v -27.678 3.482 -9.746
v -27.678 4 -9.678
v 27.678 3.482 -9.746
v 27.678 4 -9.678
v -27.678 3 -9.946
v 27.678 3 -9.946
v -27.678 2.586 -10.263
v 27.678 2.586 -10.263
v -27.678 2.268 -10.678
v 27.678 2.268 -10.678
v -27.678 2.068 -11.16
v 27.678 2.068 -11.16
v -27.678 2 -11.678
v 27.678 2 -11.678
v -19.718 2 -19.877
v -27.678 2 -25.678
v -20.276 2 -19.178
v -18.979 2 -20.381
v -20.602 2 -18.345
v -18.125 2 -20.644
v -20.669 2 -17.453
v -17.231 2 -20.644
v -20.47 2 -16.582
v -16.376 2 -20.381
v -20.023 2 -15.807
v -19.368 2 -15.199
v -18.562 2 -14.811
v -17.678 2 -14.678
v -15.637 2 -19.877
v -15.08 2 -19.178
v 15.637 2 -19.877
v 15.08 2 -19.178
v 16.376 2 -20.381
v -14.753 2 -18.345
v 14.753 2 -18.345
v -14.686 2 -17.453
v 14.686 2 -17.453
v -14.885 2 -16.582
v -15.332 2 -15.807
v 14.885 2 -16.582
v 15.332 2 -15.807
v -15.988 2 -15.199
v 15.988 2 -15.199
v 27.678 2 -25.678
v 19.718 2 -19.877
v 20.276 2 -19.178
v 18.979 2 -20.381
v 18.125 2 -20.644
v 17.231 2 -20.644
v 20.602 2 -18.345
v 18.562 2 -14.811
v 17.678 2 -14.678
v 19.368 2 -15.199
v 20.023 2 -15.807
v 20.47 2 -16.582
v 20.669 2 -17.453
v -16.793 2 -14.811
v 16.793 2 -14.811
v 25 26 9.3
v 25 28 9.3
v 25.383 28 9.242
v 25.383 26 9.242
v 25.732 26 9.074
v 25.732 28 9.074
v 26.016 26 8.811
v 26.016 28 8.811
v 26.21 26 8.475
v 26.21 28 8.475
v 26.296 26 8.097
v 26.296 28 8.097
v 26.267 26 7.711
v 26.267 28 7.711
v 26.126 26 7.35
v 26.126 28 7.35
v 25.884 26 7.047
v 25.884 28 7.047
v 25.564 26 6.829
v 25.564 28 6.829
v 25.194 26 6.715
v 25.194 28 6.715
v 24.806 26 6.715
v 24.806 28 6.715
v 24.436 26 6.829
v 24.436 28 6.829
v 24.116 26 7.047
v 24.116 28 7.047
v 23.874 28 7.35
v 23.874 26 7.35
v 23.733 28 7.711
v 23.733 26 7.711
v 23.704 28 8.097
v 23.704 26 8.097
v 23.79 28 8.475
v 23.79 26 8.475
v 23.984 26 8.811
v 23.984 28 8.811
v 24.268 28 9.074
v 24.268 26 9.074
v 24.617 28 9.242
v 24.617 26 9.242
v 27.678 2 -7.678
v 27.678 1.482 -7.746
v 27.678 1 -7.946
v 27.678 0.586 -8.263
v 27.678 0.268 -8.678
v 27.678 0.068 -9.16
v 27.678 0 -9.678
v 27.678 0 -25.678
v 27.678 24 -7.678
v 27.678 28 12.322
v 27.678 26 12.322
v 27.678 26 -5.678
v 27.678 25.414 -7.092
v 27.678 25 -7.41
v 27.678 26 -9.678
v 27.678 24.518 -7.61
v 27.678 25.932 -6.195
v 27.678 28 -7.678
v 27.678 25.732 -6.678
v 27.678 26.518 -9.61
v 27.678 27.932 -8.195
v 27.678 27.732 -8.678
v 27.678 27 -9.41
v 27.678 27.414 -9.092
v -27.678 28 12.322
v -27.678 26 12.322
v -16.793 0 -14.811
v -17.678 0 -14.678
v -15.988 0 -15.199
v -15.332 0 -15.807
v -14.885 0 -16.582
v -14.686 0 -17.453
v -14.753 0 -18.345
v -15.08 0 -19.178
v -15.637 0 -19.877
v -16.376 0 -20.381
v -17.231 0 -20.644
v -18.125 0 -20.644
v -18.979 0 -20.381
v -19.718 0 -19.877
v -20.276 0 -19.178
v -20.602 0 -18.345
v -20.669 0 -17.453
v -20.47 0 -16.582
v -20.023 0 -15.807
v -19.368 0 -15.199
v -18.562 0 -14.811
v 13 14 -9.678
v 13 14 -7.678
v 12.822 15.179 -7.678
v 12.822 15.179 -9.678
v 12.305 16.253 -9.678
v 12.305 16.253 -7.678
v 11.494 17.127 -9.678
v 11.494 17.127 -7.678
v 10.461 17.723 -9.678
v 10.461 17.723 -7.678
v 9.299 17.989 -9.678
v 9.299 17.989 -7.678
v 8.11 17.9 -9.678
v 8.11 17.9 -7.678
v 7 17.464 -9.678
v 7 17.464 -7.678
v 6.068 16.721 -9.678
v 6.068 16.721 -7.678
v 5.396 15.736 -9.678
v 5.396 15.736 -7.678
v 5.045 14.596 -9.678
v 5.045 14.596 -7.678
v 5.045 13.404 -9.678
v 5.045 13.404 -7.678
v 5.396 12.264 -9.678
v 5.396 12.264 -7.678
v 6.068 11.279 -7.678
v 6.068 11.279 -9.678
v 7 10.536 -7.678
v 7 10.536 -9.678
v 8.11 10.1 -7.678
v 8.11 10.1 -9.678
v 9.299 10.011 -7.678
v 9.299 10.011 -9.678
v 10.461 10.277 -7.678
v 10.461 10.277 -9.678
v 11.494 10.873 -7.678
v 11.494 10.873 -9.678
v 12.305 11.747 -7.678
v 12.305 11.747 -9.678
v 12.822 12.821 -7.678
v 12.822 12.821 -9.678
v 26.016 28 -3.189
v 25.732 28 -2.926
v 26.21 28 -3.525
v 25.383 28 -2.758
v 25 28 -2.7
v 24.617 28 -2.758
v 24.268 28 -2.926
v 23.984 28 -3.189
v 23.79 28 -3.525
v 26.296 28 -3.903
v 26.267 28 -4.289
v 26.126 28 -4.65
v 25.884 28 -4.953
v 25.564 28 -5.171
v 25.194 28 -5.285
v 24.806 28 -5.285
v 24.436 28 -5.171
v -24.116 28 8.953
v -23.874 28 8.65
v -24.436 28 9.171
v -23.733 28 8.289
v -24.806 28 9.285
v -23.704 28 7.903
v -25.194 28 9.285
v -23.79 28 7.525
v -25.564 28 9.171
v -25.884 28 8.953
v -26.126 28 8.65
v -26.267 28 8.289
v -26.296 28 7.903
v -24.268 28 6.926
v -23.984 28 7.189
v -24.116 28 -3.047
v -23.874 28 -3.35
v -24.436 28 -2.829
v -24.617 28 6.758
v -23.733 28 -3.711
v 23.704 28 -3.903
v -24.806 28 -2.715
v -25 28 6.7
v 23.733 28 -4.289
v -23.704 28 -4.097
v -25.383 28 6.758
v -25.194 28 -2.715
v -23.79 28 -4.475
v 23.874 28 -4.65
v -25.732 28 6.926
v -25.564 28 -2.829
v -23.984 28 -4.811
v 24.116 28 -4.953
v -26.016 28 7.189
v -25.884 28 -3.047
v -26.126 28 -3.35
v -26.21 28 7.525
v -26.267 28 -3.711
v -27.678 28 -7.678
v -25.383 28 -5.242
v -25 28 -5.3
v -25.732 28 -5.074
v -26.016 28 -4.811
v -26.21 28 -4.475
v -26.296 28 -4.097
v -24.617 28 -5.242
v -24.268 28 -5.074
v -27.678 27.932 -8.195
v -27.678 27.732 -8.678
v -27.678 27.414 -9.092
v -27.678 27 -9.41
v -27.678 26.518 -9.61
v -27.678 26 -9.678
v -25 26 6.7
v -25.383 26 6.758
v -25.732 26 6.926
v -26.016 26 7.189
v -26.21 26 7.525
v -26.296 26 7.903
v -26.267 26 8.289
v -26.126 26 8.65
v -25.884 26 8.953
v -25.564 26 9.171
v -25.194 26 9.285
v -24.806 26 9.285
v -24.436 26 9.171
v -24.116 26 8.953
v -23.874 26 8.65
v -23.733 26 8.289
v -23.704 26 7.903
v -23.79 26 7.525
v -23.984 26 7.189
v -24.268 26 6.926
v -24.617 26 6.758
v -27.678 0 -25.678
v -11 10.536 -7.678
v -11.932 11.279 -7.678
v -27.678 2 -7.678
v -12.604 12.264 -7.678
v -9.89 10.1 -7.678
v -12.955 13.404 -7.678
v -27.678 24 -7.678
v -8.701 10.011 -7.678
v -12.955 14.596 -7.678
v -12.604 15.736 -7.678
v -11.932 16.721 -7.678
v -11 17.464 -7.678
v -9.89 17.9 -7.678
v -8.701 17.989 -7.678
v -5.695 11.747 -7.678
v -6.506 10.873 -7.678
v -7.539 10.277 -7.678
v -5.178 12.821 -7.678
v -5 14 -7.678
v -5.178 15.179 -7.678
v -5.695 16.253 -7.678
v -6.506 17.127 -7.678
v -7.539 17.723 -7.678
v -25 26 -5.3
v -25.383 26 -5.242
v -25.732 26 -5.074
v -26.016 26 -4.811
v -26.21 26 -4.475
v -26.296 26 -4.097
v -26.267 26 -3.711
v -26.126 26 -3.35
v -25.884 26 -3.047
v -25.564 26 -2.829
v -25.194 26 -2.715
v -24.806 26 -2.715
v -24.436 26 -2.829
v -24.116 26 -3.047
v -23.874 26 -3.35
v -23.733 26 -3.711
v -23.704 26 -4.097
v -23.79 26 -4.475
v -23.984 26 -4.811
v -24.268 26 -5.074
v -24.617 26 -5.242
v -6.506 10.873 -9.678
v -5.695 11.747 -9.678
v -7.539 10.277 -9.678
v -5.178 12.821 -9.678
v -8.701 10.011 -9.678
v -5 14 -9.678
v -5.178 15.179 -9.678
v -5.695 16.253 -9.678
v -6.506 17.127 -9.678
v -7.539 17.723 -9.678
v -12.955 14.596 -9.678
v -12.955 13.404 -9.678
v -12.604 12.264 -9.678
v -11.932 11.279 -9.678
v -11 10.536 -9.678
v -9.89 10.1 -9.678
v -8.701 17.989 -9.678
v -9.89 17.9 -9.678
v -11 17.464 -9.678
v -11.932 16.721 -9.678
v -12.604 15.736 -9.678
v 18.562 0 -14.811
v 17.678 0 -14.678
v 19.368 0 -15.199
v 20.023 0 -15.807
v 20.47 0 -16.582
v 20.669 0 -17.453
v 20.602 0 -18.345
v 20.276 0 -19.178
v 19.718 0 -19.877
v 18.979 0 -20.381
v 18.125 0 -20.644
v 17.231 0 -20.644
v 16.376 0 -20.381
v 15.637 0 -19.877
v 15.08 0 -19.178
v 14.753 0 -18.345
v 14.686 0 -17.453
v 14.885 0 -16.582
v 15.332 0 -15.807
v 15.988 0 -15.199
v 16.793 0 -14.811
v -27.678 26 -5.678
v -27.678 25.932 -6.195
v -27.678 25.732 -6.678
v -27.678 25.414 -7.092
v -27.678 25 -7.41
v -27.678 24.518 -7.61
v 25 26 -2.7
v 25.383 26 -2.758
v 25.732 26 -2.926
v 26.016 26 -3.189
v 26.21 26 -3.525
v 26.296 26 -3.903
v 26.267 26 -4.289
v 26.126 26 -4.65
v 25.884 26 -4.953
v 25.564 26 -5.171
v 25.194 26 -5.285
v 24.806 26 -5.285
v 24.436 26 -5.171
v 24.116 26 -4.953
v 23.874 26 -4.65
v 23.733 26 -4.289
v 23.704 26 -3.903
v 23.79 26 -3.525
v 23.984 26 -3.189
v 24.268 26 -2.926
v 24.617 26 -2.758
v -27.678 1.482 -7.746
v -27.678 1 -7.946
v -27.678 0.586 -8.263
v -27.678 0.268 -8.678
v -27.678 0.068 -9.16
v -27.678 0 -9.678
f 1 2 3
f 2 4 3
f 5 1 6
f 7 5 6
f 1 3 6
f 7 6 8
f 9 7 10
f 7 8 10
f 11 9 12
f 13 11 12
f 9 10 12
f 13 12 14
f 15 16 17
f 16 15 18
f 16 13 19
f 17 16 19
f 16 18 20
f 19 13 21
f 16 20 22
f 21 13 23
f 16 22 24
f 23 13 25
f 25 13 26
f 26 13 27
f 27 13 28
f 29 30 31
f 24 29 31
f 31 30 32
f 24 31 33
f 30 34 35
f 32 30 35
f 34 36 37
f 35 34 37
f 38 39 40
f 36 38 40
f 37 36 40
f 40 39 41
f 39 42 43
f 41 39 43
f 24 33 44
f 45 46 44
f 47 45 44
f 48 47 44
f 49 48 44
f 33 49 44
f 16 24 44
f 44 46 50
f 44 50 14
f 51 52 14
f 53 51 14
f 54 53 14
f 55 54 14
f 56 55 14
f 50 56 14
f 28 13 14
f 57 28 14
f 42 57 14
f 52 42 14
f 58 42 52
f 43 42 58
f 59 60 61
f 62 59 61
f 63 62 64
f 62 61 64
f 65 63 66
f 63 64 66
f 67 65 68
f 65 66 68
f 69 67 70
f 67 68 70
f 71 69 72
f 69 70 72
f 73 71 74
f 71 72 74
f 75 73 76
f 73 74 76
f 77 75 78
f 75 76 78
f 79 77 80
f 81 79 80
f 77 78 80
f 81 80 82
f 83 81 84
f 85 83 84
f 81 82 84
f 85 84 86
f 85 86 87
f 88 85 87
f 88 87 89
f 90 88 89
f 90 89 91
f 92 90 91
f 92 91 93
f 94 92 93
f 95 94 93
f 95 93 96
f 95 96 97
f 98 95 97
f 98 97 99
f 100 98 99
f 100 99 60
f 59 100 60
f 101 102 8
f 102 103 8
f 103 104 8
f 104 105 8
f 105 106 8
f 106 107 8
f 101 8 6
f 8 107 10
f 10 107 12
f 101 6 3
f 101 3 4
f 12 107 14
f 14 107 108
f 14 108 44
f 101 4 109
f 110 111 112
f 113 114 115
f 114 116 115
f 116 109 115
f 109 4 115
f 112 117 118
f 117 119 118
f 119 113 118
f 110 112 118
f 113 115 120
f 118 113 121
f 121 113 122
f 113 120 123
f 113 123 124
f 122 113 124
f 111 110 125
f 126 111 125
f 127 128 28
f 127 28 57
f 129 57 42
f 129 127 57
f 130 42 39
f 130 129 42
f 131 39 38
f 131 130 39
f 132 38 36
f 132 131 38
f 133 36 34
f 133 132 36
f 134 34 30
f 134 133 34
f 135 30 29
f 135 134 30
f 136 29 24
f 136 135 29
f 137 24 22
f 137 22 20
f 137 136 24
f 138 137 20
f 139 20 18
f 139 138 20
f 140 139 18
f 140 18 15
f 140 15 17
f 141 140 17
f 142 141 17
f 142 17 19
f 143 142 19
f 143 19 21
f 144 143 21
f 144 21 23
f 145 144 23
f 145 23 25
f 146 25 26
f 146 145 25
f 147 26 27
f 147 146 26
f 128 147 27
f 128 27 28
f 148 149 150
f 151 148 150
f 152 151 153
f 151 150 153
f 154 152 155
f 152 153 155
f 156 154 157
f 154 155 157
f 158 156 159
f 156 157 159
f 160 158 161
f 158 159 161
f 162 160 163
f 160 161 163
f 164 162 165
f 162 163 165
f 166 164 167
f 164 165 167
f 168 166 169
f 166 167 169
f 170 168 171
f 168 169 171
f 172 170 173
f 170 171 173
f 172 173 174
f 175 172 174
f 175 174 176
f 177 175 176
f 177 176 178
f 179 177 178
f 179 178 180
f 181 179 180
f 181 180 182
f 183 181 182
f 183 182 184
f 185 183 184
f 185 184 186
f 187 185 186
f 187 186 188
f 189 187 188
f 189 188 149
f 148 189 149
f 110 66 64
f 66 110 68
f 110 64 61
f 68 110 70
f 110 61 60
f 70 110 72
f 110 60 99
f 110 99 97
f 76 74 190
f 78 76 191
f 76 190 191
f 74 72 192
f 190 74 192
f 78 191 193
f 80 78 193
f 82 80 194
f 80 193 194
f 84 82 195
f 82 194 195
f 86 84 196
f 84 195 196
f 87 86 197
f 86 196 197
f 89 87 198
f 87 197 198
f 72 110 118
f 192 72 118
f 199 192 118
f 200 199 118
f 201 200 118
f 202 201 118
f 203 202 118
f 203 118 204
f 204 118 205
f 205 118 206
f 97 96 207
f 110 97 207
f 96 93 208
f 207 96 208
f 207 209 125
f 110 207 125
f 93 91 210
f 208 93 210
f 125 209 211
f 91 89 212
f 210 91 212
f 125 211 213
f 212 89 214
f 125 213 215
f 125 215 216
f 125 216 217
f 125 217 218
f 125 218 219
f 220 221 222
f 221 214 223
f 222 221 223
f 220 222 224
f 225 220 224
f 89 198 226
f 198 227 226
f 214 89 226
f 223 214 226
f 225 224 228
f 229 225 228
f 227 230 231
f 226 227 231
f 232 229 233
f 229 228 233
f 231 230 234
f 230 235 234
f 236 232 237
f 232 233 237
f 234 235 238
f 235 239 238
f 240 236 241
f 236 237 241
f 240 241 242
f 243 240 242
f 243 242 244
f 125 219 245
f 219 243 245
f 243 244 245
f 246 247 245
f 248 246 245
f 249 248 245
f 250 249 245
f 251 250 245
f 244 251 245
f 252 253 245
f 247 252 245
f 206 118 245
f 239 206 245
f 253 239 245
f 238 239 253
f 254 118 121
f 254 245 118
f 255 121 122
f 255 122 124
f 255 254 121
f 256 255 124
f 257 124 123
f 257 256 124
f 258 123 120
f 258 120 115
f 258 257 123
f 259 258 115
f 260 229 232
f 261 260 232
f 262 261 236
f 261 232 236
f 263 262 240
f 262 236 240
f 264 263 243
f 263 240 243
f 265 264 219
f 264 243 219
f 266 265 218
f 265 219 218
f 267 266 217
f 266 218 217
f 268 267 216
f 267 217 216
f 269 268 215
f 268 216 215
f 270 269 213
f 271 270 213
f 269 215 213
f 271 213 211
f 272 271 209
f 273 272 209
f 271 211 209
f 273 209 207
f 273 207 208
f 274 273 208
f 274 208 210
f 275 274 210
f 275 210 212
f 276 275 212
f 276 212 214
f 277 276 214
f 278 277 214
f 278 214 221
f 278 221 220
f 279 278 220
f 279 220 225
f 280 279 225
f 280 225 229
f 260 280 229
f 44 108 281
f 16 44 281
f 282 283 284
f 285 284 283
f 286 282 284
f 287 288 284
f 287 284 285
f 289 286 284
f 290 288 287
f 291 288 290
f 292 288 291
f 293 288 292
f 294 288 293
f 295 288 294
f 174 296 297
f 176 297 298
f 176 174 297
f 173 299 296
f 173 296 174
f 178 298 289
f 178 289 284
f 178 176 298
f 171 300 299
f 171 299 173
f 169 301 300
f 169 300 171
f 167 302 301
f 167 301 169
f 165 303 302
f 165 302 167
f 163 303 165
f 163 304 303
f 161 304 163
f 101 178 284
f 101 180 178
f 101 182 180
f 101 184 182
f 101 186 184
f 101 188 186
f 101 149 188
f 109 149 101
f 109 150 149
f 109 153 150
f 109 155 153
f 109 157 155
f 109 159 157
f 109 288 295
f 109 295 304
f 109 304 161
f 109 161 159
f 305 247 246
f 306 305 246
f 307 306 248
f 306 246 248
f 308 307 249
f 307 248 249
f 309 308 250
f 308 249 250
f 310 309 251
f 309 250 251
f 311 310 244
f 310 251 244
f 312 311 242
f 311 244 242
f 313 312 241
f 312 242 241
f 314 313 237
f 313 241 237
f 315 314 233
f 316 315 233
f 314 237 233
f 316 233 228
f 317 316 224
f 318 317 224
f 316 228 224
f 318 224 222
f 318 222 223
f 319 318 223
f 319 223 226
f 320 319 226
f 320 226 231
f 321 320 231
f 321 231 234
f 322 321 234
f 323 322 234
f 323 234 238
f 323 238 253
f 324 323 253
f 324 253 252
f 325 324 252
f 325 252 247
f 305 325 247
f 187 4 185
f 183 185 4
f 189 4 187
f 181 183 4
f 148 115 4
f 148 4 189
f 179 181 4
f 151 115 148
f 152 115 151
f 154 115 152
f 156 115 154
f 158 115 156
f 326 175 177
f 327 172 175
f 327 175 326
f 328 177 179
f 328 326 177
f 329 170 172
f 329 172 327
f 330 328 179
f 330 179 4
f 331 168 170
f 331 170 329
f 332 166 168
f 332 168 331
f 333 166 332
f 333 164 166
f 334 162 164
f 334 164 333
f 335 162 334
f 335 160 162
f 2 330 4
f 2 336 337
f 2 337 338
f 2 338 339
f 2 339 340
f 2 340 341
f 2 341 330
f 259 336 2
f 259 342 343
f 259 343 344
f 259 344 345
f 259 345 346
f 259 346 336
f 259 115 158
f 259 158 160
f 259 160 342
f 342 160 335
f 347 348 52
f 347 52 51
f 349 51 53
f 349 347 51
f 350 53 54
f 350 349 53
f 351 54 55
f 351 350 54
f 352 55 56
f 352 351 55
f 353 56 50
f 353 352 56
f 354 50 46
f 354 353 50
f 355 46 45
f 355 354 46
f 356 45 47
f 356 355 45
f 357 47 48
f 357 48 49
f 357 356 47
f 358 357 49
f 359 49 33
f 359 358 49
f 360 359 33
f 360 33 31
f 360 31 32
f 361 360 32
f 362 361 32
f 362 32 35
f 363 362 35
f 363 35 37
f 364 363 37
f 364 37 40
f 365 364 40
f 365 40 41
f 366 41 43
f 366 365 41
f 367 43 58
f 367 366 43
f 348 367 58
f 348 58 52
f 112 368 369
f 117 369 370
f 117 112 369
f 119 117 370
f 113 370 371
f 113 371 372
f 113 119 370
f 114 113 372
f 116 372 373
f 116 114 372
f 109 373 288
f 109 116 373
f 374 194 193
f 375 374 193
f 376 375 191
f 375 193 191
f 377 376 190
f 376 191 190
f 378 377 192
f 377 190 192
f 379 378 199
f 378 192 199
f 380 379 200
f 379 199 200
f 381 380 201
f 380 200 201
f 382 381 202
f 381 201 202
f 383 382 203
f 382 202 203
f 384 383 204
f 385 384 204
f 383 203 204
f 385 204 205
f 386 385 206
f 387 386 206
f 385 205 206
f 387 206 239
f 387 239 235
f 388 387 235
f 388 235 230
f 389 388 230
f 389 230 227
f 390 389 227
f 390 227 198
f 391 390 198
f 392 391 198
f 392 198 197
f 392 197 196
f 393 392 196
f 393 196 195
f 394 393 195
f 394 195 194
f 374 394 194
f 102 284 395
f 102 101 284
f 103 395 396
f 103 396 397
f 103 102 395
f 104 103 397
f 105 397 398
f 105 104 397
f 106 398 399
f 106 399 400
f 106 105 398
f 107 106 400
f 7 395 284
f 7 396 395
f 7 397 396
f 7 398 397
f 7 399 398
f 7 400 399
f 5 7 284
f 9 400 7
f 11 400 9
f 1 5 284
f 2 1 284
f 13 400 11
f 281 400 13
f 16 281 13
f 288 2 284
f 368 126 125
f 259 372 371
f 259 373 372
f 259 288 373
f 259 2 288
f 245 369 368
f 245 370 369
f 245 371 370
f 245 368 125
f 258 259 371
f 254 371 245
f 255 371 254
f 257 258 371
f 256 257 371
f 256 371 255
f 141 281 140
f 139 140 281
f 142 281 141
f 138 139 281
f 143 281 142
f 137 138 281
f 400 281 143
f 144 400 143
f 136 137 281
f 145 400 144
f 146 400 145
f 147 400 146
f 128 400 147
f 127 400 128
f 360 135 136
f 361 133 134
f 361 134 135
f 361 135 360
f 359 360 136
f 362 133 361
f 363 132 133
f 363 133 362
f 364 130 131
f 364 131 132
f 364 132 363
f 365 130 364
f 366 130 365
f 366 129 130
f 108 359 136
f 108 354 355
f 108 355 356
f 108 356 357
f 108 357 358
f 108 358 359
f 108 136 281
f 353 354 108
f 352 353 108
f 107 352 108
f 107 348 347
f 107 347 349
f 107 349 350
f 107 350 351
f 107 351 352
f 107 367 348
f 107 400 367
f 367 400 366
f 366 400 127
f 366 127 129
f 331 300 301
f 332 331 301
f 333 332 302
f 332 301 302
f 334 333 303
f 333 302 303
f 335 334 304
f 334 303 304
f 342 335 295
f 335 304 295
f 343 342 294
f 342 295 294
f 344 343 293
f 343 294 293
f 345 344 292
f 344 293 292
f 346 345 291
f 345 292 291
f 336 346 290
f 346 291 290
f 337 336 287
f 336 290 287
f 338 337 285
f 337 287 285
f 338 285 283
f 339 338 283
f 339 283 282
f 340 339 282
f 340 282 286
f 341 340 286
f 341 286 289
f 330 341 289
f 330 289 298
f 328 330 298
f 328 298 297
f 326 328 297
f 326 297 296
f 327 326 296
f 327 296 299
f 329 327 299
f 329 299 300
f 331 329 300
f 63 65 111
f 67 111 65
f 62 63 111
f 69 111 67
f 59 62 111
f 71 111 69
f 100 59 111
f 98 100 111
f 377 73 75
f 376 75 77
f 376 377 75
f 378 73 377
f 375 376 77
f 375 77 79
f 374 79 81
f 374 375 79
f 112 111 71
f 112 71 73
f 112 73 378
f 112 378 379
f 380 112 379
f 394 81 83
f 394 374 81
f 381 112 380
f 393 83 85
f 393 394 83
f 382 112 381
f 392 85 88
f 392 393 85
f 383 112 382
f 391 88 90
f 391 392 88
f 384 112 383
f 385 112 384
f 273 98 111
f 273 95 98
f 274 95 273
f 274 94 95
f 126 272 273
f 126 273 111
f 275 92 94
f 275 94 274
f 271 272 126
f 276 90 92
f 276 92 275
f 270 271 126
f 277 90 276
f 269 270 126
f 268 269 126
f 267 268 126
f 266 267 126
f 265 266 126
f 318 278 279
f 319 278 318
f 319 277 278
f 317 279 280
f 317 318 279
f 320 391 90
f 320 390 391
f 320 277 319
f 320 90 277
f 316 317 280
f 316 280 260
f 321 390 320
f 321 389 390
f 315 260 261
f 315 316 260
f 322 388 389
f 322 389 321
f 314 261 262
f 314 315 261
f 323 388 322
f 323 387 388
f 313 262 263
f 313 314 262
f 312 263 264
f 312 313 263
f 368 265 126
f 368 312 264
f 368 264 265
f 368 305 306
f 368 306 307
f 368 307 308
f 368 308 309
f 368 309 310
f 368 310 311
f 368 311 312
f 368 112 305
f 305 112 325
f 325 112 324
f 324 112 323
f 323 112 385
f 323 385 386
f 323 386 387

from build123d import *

# Parameters (mm, degrees)
SKETCH_1_R          = 3
EXTRUDE_1_DEPTH     = 2
SKETCH_2_R          = 4
SKETCH_2_W          = 27.67766953
SKETCH_2_H          = 2
EXTRUDE_2_DEPTH     = 2
EXTRUDE_START       = 2
SKETCH_3_W          = 55.35533906
SKETCH_3_H          = 26
SKETCH_3_R          = 4
EXTRUDE_3_DEPTH     = 2
SKETCH_4_W          = 55.35533906
SKETCH_4_H          = 24
CUT_EXTRUDE_1_DEPTH = 2
FILLET_1_R          = 2
SKETCH_5_W          = 55.35533906
SKETCH_5_H          = 2
EXTRUDE_4_DEPTH     = 22
SKETCH_6_R          = 1.3
CUT_EXTRUDE_2_DEPTH = 22
FILLET_2_R          = 2
FILLET_3_R          = 2
FILLET_4_R          = 2


with BuildPart() as part:
    # 草图1 → 凸台-拉伸1 (new body)
    with BuildSketch(Plane(origin=(0, 0, 0), x_dir=(1, 0, 0), z_dir=(0, 1, 0))):
        Polygon((-17.67766953, 9.67766953), (-27.67766953, 9.67766953), (-27.67766953, 25.67766953), (17.67766953, 25.67766953), (27.67766953, 25.67766953), (27.67766953, 9.67766953), align=None)
        with Locations(Location((-17.67766953, 17.67766953, 0), (0, 0, 270))):
            Circle(SKETCH_1_R, mode=Mode.SUBTRACT)
        with Locations(Location((17.67766953, 17.67766953, 0), (0, 0, 270))):
            Circle(SKETCH_1_R, mode=Mode.SUBTRACT)
    extrude(amount=EXTRUDE_1_DEPTH)

    # 草图2 → 凸台-拉伸2 (add)
    # profile 1 of 3: a face of its own
    with BuildSketch(Plane.XY.offset(-9.67766953)):
        Polygon((-27.67766953, 26), (-27.67766953, 2), (0, 2), (27.67766953, 2), (27.67766953, 26), align=None)
        with Locations((-9, 14)):
            Circle(SKETCH_2_R, mode=Mode.SUBTRACT)
        with Locations((9, 14)):
            Circle(SKETCH_2_R, mode=Mode.SUBTRACT)
    # profile 2 of 3: a face of its own
    with BuildSketch(Plane.XY.offset(-9.67766953)):
        with Locations((-13.838834765, 1)):
            Rectangle(SKETCH_2_W, SKETCH_2_H)
    # profile 3 of 3: a face of its own
    with BuildSketch(Plane.XY.offset(-9.67766953)):
        with Locations((13.838834765, 1)):
            Rectangle(SKETCH_2_W, SKETCH_2_H)
    extrude(amount=-EXTRUDE_2_DEPTH)

    # 草图3 → 凸台-拉伸3 (add)
    with BuildSketch(Plane.XY.offset(-9.67766953).offset(EXTRUDE_START)):
        with Locations((0, 13)):
            Rectangle(SKETCH_3_W, SKETCH_3_H)
        with Locations((-9, 14)):
            Circle(SKETCH_3_R, mode=Mode.SUBTRACT)
        with Locations((9, 14)):
            Circle(SKETCH_3_R, mode=Mode.SUBTRACT)
    extrude(amount=-EXTRUDE_3_DEPTH)

    # 草图4 → 切除-拉伸1 (cut)
    with BuildSketch(Plane.XY.offset(-9.67766953)):
        with Locations((0, 14)):
            Rectangle(SKETCH_4_W, SKETCH_4_H)
    extrude(amount=-CUT_EXTRUDE_1_DEPTH, mode=Mode.SUBTRACT)

    # 圆角1
    fillet_1_edges = [part.edges().sort_by_distance(p)[0] for p in [
        (0, 0, -7.67766953),
    ]]
    fillet(fillet_1_edges, radius=FILLET_1_R)

    # 草图5 → 凸台-拉伸4 (add)
    with BuildSketch(Plane(origin=(0, 0, -9.67766953), x_dir=(-1, 0, 0), z_dir=(0, 0, -1))):
        with Locations((0, 27)):
            Rectangle(SKETCH_5_W, SKETCH_5_H)
    extrude(amount=-EXTRUDE_4_DEPTH)

    # 草图6 → 切除-拉伸2 (cut)
    with BuildSketch(Plane(origin=(0, 28, 0), x_dir=(1, 0, 0), z_dir=(0, 1, 0))):
        with Locations(Location((25, -8, 0), (0, 0, 270))):
            Circle(SKETCH_6_R)
        with Locations(Location((25, 4, 0), (0, 0, 270))):
            Circle(SKETCH_6_R)
        with Locations(Location((-25, 4, 0), (0, 0, 90))):
            Circle(SKETCH_6_R)
        with Locations(Location((-25, -8, 0), (0, 0, 90))):
            Circle(SKETCH_6_R)
    extrude(amount=-CUT_EXTRUDE_2_DEPTH, mode=Mode.SUBTRACT)

    # 圆角2
    fillet_2_edges = [part.edges().sort_by_distance(p)[0] for p in [
        (0, 28, -9.67766953),
    ]]
    fillet(fillet_2_edges, radius=FILLET_2_R)

    # 圆角3
    fillet_3_edges = [part.edges().sort_by_distance(p)[0] for p in [
        (0, 26, -7.67766953),
    ]]
    fillet(fillet_3_edges, radius=FILLET_3_R)

    # 圆角4
    fillet_4_edges = [part.edges().sort_by_distance(p)[0] for p in [
        (0, 2, -9.67766953),
    ]]
    fillet(fillet_4_edges, radius=FILLET_4_R)


solid = part.part
